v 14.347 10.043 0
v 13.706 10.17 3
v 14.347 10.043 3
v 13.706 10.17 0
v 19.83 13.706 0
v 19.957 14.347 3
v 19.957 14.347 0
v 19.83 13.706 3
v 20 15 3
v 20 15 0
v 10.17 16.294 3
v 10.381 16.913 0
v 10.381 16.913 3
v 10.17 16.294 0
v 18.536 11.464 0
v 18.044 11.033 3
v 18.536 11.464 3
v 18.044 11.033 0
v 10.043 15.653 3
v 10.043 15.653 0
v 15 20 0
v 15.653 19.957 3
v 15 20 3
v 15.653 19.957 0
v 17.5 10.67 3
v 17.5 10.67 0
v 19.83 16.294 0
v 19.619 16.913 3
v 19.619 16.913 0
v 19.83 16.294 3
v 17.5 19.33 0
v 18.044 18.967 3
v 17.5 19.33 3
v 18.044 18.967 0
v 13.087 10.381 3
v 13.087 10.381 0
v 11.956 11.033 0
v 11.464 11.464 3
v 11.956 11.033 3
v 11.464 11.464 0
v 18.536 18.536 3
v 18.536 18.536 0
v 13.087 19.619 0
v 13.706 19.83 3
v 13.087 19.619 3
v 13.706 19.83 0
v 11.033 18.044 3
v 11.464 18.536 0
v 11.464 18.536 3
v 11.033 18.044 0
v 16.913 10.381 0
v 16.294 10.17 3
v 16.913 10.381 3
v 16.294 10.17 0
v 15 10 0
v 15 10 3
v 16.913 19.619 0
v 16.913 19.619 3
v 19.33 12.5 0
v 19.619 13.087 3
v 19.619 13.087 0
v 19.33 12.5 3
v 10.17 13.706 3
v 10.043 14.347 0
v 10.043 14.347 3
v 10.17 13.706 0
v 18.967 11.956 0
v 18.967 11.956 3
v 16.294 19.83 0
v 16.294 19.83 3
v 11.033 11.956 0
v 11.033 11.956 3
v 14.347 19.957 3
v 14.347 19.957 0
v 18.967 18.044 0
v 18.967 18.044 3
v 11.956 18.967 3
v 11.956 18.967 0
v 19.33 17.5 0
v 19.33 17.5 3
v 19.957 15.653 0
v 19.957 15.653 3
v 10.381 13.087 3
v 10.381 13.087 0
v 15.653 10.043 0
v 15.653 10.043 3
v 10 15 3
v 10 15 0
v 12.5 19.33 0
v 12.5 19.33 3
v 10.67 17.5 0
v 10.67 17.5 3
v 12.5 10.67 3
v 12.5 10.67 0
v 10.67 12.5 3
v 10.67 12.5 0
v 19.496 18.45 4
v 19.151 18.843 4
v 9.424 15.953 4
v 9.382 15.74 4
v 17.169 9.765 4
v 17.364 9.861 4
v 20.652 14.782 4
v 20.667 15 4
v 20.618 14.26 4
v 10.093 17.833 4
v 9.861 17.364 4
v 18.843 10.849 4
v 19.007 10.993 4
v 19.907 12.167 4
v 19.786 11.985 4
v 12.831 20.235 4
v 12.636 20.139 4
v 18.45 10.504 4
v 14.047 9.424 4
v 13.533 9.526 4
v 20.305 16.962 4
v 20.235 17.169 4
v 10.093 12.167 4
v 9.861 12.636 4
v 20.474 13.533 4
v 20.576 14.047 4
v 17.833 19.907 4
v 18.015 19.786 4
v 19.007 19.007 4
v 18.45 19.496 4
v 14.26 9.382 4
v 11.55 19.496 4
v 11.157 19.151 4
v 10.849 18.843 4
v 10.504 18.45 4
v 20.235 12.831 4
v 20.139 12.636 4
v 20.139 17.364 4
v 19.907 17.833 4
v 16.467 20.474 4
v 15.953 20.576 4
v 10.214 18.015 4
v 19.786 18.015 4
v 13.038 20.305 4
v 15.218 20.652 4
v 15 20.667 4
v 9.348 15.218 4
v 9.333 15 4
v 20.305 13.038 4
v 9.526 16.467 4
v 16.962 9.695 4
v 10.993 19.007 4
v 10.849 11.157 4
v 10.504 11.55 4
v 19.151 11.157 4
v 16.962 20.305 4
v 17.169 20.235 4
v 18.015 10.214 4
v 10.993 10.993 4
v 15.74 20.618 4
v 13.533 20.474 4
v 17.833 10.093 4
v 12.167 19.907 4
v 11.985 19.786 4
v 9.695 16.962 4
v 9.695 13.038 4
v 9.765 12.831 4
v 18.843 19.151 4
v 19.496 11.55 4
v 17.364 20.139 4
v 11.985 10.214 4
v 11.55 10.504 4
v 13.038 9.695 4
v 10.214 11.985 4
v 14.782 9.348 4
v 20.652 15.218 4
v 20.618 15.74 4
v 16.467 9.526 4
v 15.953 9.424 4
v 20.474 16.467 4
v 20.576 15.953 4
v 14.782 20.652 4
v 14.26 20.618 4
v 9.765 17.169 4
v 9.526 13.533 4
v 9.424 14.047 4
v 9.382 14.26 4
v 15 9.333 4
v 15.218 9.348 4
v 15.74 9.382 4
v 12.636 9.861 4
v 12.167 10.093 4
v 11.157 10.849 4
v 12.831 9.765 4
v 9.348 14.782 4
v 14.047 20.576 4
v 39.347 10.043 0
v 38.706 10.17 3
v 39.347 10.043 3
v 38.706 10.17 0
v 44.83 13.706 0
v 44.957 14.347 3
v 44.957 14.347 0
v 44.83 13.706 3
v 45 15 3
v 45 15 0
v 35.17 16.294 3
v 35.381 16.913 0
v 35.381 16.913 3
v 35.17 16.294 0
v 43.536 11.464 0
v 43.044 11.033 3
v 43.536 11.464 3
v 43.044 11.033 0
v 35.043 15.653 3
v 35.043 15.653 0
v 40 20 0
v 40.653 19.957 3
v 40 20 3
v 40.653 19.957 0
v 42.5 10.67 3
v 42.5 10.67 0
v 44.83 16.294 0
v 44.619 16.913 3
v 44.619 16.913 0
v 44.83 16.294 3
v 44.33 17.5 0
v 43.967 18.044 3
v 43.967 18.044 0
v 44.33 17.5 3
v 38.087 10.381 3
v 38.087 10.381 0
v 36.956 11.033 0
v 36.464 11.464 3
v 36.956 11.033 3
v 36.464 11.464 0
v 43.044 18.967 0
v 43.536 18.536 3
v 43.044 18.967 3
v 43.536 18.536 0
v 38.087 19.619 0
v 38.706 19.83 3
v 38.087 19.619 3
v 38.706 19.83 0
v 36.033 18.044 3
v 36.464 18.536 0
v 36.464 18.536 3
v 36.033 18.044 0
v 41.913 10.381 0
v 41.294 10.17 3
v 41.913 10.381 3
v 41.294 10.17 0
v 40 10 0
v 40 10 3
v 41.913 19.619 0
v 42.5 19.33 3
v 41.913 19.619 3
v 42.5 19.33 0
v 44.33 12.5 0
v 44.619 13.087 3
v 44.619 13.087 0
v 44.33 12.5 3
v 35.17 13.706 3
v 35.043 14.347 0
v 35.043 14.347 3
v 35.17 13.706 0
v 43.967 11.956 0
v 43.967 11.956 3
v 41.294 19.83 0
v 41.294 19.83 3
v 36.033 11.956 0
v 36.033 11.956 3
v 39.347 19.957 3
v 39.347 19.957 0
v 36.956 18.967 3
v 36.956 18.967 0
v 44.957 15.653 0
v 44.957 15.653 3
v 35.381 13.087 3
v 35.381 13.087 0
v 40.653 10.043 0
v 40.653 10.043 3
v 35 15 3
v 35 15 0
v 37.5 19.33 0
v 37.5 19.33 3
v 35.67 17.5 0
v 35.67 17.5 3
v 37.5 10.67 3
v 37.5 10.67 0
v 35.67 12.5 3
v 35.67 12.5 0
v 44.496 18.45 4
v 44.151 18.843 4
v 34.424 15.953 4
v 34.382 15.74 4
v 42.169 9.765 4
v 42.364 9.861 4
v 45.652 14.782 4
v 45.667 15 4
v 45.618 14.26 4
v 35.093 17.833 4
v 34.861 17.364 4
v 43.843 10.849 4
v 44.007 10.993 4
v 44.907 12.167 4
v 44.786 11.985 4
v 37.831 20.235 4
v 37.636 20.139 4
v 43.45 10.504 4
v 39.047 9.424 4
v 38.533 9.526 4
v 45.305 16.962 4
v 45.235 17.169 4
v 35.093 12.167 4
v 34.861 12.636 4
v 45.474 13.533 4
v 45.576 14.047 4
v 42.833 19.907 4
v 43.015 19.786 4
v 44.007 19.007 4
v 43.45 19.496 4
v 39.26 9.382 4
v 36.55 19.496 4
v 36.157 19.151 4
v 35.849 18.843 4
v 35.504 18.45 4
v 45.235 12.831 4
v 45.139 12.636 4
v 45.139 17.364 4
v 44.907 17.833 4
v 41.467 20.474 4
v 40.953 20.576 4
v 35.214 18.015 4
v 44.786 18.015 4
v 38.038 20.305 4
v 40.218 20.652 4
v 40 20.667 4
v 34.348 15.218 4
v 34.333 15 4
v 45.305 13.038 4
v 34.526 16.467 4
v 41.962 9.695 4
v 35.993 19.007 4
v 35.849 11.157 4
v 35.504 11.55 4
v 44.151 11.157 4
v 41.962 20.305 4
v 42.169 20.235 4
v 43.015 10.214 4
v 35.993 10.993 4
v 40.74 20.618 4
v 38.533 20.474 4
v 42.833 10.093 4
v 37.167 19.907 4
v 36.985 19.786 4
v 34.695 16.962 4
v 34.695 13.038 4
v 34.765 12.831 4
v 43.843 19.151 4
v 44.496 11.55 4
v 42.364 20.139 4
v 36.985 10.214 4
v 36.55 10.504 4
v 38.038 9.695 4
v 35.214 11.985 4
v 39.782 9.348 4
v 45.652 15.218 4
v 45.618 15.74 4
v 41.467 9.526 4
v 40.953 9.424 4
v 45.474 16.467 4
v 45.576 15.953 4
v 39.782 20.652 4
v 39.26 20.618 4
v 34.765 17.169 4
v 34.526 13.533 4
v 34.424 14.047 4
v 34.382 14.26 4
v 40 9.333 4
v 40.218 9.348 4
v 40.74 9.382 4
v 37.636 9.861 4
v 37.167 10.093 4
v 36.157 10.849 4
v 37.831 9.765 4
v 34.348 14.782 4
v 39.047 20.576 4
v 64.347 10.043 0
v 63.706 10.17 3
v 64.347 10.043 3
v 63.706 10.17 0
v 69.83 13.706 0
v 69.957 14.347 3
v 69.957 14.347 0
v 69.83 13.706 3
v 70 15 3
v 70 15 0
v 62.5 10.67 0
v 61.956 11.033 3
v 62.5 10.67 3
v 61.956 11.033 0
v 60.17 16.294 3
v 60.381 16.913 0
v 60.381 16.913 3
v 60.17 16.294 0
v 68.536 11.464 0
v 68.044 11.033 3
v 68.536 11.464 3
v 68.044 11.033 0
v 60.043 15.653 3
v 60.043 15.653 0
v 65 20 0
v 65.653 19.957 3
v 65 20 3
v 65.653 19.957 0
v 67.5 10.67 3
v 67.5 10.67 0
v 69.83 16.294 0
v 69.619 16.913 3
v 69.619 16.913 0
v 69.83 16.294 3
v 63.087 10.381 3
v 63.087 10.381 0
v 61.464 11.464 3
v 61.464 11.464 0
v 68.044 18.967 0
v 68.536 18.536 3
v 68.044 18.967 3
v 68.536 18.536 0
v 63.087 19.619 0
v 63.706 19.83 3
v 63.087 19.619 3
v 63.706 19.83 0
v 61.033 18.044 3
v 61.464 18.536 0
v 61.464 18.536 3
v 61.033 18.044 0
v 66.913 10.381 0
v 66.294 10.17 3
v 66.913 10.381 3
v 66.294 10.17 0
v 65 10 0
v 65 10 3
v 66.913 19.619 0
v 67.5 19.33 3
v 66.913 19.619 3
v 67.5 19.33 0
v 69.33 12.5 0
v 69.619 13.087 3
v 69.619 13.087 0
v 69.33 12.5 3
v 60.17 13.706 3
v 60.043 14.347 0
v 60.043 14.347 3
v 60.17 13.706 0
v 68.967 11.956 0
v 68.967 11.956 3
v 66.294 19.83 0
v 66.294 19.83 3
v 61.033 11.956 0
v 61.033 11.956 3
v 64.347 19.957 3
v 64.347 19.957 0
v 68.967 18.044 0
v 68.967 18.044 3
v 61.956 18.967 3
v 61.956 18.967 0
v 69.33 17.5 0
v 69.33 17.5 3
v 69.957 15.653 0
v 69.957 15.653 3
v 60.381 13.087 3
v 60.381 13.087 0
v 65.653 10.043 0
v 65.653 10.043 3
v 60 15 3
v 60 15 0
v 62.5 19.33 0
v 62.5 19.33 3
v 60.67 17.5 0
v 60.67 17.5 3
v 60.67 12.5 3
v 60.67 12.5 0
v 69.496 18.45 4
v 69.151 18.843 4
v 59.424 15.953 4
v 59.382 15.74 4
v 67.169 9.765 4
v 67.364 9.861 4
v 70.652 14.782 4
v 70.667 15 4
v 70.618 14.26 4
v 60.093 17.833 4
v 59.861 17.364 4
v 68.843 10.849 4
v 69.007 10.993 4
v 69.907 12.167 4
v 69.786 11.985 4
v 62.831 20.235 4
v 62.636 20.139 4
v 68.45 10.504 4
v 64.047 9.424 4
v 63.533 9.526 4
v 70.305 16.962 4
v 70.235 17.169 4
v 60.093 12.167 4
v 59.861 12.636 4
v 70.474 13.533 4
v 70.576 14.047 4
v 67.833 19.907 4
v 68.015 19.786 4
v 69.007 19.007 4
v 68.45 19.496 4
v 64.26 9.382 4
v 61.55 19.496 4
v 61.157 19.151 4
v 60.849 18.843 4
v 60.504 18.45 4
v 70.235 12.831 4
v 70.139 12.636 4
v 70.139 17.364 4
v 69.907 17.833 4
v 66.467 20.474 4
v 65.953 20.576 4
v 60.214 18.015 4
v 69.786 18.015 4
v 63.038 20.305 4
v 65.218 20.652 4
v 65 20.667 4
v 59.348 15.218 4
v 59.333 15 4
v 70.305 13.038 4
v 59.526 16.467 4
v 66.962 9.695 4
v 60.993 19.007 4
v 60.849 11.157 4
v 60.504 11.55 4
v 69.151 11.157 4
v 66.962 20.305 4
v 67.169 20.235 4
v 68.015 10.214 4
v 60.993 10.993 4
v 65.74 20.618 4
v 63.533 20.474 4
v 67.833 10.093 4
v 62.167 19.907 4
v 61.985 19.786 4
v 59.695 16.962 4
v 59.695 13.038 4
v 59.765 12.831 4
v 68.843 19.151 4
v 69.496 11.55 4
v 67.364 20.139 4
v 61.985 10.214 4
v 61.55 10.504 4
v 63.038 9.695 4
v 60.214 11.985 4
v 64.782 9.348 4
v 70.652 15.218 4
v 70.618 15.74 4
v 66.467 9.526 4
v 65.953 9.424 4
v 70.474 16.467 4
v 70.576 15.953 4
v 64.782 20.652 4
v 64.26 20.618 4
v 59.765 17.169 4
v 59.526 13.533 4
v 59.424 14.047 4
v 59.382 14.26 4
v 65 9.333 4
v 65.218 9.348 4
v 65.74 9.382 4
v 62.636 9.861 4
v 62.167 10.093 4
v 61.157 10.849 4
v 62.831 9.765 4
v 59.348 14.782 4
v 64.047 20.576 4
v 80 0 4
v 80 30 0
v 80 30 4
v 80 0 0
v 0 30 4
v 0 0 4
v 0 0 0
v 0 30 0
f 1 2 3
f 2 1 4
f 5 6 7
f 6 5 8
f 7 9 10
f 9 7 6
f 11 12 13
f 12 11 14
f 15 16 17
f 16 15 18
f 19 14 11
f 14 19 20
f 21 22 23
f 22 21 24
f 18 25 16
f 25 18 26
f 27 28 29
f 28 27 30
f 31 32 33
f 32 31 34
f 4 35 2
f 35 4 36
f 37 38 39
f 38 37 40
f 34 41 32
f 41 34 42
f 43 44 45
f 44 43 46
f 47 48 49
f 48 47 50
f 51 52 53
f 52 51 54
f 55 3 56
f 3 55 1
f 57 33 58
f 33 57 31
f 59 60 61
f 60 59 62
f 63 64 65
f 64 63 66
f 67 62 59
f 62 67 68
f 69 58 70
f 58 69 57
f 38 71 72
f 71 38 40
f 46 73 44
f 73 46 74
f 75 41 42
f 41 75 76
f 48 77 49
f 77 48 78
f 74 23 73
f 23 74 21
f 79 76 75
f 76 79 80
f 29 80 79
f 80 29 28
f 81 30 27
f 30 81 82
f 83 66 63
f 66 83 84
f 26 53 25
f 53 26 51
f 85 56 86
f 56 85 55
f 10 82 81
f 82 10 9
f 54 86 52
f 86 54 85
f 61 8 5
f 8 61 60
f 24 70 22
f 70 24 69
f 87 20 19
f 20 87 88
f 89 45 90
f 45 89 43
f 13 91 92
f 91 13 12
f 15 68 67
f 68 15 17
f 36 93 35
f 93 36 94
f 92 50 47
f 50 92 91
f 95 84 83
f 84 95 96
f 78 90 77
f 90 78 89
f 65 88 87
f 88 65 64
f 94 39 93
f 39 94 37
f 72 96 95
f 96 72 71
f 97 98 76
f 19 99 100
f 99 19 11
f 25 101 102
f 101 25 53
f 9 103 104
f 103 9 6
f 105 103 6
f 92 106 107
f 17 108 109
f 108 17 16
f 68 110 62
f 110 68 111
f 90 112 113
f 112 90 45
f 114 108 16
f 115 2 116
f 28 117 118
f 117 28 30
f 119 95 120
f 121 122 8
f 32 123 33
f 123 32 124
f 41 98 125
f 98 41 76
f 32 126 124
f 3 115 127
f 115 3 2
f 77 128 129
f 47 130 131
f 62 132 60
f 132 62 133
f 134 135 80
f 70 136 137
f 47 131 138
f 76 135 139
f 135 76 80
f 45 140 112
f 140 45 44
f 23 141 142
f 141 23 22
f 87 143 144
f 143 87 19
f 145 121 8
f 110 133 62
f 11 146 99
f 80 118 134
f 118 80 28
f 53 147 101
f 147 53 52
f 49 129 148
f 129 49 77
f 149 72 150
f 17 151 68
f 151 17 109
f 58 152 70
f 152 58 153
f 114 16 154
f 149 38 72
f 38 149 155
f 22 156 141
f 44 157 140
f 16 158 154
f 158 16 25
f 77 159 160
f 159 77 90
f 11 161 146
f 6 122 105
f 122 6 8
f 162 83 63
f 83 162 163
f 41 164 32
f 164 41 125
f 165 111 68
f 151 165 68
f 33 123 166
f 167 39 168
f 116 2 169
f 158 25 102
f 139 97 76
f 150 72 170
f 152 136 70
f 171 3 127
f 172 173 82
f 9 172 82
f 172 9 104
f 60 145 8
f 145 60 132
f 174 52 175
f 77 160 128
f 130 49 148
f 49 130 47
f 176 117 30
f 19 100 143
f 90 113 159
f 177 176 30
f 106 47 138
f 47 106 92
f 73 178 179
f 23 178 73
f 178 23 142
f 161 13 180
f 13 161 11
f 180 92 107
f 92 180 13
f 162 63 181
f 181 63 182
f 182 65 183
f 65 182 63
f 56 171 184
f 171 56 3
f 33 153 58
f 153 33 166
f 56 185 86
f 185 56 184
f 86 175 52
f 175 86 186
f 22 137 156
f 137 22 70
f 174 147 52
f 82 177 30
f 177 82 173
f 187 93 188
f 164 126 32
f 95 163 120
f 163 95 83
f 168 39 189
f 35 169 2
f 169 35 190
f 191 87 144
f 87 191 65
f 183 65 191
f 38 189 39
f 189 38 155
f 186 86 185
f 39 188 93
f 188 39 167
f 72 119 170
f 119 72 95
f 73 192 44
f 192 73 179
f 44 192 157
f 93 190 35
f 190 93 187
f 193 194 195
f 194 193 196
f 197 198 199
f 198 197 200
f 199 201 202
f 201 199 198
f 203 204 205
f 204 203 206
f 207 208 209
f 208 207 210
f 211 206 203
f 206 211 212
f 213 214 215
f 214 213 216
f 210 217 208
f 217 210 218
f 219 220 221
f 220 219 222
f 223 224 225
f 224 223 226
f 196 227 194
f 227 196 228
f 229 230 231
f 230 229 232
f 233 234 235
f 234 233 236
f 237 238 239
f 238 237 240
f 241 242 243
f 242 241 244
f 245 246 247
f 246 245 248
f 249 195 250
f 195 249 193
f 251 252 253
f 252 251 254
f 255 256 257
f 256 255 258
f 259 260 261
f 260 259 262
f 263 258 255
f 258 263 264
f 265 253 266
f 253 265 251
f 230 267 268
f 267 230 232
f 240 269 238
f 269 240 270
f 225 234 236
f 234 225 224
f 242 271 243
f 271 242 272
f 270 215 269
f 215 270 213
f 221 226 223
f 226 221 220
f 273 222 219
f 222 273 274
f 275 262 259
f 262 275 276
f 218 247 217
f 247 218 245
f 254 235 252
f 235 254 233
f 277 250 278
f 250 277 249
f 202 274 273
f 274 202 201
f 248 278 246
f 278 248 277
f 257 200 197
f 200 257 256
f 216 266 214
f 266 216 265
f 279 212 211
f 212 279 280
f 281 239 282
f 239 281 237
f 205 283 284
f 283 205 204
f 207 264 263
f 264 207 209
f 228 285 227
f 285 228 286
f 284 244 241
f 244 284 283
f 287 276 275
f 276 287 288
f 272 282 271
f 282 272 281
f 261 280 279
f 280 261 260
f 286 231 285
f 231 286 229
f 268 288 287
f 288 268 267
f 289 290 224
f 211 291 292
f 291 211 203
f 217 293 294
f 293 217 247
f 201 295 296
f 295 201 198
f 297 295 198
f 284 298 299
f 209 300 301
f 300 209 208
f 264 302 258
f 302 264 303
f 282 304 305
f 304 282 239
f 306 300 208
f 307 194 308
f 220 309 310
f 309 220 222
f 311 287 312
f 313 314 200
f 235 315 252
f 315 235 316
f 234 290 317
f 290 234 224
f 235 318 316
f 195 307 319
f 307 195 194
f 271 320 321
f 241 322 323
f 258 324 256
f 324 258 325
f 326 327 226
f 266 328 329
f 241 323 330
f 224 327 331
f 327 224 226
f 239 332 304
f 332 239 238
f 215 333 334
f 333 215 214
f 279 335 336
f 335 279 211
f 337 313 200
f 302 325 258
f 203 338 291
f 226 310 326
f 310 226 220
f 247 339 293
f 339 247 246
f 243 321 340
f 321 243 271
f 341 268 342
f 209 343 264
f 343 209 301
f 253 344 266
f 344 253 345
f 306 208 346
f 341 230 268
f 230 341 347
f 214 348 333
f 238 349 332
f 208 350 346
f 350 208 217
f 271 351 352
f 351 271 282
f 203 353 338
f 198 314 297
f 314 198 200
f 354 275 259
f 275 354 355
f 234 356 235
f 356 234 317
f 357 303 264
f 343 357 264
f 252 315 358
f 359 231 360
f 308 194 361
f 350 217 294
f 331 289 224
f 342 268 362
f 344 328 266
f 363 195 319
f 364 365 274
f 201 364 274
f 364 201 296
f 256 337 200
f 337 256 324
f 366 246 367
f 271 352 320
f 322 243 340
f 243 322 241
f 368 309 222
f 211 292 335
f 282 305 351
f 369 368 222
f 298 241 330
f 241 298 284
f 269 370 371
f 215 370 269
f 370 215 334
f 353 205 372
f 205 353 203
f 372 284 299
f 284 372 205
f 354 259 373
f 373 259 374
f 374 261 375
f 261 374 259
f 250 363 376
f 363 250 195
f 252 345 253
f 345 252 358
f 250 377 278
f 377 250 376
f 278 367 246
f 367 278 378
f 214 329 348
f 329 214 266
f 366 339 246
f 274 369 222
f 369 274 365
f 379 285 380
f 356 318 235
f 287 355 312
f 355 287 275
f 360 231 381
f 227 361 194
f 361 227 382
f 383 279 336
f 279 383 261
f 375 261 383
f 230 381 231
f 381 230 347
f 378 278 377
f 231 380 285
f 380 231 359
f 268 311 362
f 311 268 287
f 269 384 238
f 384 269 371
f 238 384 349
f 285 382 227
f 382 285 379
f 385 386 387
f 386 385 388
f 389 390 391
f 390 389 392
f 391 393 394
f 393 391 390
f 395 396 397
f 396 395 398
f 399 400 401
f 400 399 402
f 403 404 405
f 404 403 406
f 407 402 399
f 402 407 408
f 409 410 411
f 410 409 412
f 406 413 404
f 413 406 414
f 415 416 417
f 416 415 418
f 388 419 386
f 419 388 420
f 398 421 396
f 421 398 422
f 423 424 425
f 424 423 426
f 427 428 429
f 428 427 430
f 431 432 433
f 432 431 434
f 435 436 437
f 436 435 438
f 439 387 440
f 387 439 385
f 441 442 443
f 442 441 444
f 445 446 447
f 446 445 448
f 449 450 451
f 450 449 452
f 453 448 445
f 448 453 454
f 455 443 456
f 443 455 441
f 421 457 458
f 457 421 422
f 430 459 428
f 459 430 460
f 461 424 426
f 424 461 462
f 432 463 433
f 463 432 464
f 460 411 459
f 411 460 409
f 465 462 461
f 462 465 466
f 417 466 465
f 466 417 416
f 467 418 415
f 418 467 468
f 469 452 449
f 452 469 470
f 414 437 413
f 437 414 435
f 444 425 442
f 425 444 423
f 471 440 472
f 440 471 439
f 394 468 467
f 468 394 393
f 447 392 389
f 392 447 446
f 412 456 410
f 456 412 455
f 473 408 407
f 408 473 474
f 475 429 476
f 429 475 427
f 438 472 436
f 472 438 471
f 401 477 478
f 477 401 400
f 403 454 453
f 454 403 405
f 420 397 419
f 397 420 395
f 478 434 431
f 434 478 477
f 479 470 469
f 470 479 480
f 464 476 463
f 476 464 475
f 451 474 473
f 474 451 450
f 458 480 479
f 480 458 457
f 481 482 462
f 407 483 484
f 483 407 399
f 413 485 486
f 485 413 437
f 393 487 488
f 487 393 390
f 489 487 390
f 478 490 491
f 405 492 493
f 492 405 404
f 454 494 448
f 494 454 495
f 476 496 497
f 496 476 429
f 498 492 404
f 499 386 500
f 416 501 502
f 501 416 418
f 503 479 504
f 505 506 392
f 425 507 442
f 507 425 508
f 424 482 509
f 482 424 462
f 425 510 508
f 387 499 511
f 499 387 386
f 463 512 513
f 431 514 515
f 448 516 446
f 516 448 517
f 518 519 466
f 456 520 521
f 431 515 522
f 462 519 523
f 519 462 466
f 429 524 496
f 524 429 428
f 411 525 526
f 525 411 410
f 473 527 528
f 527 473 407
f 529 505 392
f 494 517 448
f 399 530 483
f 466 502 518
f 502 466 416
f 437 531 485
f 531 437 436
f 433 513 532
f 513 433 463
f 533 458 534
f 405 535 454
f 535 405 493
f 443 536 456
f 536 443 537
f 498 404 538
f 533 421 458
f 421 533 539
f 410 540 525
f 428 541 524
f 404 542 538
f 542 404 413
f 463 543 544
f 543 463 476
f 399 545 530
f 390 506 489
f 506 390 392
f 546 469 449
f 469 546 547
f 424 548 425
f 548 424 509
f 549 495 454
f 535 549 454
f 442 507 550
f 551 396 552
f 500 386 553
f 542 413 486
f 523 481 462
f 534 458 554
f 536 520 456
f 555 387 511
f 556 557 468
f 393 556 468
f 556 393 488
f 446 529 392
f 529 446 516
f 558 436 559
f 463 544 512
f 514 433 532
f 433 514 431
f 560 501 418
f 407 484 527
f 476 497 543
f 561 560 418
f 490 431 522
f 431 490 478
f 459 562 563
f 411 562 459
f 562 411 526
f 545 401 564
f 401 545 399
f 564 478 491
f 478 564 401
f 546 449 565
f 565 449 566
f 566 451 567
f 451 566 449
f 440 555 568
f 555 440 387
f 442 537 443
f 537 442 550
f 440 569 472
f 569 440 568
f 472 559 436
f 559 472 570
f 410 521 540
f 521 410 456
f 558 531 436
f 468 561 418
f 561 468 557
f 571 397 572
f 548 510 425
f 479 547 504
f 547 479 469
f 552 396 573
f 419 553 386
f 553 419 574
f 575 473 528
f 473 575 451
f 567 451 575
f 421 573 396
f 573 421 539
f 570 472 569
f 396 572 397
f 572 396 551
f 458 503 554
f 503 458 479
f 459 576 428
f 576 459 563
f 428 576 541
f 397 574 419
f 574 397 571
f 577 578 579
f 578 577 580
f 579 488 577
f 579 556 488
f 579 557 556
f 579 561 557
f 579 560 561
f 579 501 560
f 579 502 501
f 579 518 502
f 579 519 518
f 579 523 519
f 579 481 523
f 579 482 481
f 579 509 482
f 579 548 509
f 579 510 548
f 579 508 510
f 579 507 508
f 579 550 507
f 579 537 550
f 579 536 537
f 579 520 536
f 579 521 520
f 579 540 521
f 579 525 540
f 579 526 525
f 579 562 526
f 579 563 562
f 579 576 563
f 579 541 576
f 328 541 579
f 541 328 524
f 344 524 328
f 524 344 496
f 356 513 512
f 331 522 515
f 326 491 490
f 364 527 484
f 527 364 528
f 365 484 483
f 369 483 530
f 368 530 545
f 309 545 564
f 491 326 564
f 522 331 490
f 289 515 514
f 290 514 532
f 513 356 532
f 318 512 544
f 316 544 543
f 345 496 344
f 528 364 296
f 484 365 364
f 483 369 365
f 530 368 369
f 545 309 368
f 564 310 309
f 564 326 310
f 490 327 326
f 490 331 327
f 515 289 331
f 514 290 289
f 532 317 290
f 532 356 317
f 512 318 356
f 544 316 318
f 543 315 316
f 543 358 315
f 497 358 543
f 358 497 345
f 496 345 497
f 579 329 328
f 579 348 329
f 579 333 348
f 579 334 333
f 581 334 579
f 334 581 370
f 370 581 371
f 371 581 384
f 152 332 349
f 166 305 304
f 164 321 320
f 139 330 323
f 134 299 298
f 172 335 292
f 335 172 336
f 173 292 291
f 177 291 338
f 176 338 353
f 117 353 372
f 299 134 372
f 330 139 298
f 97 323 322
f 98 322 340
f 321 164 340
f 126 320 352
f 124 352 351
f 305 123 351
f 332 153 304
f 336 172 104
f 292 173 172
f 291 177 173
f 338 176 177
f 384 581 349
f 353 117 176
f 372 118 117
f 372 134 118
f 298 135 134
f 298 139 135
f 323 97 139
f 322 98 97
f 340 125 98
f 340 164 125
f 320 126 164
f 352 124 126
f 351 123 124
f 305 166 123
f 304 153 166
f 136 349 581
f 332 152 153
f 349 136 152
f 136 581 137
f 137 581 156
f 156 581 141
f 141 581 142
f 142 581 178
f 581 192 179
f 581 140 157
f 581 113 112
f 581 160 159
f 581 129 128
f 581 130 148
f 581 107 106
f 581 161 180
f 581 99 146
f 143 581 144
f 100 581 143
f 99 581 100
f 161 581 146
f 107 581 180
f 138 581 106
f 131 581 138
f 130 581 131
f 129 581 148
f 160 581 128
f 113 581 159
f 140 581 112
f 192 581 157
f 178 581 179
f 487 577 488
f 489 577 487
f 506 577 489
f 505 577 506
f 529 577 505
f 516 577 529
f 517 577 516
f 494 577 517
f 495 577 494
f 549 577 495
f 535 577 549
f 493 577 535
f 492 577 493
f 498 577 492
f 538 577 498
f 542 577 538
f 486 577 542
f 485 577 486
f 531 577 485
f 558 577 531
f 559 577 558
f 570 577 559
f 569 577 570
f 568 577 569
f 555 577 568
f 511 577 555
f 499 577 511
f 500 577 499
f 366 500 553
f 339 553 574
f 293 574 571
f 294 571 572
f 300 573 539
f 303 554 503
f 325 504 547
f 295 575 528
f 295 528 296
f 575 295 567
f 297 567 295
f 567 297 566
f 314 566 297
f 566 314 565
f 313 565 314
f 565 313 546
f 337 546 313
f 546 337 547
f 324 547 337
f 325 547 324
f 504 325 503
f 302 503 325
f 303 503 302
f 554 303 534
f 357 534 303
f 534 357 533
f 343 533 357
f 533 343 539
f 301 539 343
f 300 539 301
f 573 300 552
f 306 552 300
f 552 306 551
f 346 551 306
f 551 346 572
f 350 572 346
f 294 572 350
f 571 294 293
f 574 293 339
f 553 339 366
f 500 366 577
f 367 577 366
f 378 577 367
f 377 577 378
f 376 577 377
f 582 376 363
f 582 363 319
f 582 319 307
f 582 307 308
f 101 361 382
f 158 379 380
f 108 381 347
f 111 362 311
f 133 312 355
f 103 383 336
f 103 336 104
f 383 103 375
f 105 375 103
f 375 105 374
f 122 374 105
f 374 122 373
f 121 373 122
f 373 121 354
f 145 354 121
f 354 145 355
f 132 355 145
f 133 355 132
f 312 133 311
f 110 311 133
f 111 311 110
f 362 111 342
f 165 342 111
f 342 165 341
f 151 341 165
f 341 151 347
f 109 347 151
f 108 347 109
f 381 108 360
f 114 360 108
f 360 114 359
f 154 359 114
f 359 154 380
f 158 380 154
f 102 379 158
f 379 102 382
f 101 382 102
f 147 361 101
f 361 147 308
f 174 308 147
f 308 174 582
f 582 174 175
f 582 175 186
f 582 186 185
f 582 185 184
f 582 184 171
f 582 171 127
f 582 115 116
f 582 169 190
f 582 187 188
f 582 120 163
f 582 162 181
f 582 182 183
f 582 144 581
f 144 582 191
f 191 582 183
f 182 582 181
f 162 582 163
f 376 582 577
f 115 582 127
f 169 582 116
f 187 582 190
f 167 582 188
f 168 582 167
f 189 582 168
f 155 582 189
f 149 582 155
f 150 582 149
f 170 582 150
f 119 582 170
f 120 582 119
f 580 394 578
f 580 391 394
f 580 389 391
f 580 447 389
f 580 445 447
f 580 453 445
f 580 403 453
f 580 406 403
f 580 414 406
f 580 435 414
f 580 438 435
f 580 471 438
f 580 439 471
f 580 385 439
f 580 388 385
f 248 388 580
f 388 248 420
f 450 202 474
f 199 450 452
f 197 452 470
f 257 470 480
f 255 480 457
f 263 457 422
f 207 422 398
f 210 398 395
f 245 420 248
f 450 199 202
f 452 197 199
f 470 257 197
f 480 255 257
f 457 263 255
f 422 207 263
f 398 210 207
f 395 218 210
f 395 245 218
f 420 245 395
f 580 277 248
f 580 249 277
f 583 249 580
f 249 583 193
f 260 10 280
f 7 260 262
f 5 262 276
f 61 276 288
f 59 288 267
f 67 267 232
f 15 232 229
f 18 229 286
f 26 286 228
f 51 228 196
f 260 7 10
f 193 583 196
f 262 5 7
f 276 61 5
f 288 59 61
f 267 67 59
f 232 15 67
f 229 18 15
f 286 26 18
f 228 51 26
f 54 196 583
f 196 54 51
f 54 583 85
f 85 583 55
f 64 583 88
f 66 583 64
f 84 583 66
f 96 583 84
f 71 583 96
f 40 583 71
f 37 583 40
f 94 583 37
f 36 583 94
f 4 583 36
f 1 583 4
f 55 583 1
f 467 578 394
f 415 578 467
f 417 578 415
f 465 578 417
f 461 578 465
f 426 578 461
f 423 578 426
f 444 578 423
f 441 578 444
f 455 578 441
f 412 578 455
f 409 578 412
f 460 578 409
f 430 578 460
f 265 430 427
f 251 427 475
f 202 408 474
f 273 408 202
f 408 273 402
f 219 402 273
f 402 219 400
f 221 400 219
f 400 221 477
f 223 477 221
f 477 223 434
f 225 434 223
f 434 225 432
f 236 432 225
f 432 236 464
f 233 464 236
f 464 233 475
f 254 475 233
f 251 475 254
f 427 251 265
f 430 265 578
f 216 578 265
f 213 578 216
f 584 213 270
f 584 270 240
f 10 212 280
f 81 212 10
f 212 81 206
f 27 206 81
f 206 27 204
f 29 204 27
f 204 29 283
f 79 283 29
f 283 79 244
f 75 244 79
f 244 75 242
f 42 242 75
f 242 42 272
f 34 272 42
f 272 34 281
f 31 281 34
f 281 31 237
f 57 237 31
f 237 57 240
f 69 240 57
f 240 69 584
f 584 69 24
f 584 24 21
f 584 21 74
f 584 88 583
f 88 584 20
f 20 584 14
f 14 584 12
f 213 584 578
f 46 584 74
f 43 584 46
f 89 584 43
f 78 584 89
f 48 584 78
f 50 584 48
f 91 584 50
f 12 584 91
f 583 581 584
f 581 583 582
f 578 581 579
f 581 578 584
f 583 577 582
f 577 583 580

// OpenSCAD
// units=mm — generated by scad_emitter.py
// part=unnamed
$fn = 48;

difference() { cube([80, 30, 4]); union() { translate([15, 15, 4.5]) rotate([180, 0, 0]) cylinder(h=5, r=5, $fn=$fn); translate([15, 15, 4.5]) rotate([180, 0, 0]) cylinder(h=1.5, r1=6, r2=5, $fn=$fn); } union() { translate([40, 15, 4.5]) rotate([180, 0, 0]) cylinder(h=5, r=5, $fn=$fn); translate([40, 15, 4.5]) rotate([180, 0, 0]) cylinder(h=1.5, r1=6, r2=5, $fn=$fn); } union() { translate([65, 15, 4.5]) rotate([180, 0, 0]) cylinder(h=5, r=5, $fn=$fn); translate([65, 15, 4.5]) rotate([180, 0, 0]) cylinder(h=1.5, r1=6, r2=5, $fn=$fn); } }
